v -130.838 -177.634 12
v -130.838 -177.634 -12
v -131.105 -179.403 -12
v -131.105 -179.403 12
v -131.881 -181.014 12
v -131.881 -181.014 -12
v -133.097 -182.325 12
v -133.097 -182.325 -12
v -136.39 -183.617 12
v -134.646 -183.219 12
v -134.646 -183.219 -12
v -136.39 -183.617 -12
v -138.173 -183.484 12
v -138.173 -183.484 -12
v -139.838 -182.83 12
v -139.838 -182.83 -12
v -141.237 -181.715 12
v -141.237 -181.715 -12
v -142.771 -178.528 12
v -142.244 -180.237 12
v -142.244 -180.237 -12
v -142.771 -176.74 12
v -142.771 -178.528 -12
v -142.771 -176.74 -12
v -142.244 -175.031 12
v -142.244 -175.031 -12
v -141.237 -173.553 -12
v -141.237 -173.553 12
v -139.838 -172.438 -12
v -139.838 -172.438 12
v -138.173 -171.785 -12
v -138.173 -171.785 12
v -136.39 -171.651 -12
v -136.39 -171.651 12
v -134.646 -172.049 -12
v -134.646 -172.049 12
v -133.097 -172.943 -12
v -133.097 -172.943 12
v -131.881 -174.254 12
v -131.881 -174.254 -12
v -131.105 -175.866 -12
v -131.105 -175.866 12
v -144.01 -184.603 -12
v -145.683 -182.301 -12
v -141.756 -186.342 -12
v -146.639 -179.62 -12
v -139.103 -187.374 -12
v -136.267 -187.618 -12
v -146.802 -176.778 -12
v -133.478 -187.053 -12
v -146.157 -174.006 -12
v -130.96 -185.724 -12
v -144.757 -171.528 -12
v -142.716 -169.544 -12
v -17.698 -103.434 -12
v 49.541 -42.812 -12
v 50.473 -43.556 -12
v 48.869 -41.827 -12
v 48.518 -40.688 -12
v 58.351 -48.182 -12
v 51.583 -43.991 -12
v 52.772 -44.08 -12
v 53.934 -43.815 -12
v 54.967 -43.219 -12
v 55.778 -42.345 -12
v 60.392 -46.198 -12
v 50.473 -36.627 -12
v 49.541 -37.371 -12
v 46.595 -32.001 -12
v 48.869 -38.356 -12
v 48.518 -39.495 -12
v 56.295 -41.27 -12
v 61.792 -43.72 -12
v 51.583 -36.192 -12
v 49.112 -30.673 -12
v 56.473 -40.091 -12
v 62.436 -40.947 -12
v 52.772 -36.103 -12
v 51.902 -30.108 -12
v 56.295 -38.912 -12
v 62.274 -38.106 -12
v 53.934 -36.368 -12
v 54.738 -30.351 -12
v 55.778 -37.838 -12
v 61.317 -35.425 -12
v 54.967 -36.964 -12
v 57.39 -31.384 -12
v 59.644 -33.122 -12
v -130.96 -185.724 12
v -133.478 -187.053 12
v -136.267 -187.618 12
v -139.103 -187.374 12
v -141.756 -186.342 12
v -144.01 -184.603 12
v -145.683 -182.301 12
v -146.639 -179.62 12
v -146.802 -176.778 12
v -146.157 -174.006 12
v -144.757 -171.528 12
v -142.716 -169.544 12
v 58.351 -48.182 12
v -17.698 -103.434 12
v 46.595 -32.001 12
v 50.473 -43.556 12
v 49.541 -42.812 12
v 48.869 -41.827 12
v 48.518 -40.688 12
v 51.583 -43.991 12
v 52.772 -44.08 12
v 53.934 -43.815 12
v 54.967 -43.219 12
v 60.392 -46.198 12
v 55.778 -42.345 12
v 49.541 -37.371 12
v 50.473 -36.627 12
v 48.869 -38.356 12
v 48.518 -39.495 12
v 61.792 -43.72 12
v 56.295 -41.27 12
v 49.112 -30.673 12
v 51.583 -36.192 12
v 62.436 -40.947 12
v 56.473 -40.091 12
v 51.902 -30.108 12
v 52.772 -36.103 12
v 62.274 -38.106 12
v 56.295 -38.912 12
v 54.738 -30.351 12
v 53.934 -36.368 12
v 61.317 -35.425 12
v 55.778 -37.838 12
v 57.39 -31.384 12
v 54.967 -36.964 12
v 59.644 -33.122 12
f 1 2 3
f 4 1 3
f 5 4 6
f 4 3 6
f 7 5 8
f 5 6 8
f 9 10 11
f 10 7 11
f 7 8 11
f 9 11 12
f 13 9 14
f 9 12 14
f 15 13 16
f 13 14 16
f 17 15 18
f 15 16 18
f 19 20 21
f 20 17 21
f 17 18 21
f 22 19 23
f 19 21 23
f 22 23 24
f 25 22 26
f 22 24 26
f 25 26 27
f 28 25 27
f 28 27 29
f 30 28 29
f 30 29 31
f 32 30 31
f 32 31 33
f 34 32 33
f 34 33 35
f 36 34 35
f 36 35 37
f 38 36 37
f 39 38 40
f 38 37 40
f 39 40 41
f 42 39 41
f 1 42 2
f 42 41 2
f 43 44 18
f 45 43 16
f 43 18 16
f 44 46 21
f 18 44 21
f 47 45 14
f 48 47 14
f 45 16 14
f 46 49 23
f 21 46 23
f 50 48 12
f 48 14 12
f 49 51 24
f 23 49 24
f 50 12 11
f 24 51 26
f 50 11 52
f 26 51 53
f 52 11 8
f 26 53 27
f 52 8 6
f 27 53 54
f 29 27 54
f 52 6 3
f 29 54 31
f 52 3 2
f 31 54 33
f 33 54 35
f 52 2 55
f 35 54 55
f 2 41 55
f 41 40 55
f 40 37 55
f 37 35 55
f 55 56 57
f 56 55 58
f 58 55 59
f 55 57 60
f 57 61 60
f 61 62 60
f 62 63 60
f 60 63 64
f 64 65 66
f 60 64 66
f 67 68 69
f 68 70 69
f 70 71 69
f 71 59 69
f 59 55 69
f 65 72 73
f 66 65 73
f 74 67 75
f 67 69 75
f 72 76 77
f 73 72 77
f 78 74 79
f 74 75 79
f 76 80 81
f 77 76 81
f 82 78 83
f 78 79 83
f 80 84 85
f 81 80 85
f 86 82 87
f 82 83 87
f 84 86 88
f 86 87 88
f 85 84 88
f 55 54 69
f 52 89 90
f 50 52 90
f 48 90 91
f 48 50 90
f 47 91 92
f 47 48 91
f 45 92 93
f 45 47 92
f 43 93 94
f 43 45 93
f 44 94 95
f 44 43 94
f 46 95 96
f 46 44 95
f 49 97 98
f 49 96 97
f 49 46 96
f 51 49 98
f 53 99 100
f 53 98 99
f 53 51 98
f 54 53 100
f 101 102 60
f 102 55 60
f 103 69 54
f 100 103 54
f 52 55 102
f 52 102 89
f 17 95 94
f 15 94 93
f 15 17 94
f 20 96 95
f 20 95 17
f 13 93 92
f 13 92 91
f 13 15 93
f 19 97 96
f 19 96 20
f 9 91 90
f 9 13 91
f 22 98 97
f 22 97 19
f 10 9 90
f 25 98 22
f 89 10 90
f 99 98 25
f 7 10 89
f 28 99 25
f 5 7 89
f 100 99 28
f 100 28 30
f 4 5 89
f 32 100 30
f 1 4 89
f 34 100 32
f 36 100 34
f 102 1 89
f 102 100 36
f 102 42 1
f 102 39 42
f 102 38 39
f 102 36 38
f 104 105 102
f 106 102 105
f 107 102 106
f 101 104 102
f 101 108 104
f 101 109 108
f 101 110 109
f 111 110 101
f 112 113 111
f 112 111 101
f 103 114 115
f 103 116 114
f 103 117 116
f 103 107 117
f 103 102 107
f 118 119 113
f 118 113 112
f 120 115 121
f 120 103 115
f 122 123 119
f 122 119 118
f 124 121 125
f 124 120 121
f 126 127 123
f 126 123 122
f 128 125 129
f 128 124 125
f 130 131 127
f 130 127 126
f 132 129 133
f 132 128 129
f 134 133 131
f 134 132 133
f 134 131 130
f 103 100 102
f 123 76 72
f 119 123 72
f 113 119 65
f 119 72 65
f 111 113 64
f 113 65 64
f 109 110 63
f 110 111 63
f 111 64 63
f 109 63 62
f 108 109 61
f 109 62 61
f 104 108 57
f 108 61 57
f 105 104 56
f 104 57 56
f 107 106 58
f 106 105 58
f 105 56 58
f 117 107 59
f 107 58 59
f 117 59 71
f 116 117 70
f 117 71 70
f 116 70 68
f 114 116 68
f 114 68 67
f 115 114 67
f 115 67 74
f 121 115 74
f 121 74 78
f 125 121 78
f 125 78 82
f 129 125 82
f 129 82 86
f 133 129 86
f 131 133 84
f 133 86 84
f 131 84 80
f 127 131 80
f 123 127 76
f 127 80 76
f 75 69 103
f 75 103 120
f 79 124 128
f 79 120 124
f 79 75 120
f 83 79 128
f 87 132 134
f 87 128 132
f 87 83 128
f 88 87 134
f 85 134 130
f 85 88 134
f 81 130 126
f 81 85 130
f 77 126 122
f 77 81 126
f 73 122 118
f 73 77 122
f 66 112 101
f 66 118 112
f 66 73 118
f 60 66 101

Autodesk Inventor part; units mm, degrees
ref_plane "YZ Plane" through (0, 0, 0) normal (1, 0, 0) x (0, 1, 0)
ref_plane "XZ Plane" through (0, 0, 0) normal (0, 1, 0) x (-1, 0, 0)
ref_plane "XY Plane" through (0, 0, 0) normal (0, 0, 1) x (1, 0, 0)
sketch "Sketch1" plane through (0, 0, 0) normal (0, 0, 1) x (1, 0, 0)
  arc A0 (-142.7162, -169.544) -> (-130.9605, -185.7243) centre (-136.8383, -177.6341) ccw
  line L0 (-17.6981, -103.4344) -> (-130.9605, -185.7243)
  line L1 (46.5951, -32.0012) -> (-142.7162, -169.544)
  line L2 (-17.6981, -103.4344) -> (58.3508, -48.1816)
  arc A1 (58.3508, -48.1816) -> (46.5951, -32.0012) centre (52.473, -40.0914) ccw
  circle A2 centre (52.473, -40.0914) radius 4
  circle A3 centre (-136.8383, -177.6341) radius 6
  point P0 (0, 0)
  point P1 (0, 0)
  dimension "d0" = 8
  dimension "d3" = 12
extrude "Extrusion1" add sketch "Sketch1" along normal mid plane 24
properties part number "Second part of arm of gripper"
